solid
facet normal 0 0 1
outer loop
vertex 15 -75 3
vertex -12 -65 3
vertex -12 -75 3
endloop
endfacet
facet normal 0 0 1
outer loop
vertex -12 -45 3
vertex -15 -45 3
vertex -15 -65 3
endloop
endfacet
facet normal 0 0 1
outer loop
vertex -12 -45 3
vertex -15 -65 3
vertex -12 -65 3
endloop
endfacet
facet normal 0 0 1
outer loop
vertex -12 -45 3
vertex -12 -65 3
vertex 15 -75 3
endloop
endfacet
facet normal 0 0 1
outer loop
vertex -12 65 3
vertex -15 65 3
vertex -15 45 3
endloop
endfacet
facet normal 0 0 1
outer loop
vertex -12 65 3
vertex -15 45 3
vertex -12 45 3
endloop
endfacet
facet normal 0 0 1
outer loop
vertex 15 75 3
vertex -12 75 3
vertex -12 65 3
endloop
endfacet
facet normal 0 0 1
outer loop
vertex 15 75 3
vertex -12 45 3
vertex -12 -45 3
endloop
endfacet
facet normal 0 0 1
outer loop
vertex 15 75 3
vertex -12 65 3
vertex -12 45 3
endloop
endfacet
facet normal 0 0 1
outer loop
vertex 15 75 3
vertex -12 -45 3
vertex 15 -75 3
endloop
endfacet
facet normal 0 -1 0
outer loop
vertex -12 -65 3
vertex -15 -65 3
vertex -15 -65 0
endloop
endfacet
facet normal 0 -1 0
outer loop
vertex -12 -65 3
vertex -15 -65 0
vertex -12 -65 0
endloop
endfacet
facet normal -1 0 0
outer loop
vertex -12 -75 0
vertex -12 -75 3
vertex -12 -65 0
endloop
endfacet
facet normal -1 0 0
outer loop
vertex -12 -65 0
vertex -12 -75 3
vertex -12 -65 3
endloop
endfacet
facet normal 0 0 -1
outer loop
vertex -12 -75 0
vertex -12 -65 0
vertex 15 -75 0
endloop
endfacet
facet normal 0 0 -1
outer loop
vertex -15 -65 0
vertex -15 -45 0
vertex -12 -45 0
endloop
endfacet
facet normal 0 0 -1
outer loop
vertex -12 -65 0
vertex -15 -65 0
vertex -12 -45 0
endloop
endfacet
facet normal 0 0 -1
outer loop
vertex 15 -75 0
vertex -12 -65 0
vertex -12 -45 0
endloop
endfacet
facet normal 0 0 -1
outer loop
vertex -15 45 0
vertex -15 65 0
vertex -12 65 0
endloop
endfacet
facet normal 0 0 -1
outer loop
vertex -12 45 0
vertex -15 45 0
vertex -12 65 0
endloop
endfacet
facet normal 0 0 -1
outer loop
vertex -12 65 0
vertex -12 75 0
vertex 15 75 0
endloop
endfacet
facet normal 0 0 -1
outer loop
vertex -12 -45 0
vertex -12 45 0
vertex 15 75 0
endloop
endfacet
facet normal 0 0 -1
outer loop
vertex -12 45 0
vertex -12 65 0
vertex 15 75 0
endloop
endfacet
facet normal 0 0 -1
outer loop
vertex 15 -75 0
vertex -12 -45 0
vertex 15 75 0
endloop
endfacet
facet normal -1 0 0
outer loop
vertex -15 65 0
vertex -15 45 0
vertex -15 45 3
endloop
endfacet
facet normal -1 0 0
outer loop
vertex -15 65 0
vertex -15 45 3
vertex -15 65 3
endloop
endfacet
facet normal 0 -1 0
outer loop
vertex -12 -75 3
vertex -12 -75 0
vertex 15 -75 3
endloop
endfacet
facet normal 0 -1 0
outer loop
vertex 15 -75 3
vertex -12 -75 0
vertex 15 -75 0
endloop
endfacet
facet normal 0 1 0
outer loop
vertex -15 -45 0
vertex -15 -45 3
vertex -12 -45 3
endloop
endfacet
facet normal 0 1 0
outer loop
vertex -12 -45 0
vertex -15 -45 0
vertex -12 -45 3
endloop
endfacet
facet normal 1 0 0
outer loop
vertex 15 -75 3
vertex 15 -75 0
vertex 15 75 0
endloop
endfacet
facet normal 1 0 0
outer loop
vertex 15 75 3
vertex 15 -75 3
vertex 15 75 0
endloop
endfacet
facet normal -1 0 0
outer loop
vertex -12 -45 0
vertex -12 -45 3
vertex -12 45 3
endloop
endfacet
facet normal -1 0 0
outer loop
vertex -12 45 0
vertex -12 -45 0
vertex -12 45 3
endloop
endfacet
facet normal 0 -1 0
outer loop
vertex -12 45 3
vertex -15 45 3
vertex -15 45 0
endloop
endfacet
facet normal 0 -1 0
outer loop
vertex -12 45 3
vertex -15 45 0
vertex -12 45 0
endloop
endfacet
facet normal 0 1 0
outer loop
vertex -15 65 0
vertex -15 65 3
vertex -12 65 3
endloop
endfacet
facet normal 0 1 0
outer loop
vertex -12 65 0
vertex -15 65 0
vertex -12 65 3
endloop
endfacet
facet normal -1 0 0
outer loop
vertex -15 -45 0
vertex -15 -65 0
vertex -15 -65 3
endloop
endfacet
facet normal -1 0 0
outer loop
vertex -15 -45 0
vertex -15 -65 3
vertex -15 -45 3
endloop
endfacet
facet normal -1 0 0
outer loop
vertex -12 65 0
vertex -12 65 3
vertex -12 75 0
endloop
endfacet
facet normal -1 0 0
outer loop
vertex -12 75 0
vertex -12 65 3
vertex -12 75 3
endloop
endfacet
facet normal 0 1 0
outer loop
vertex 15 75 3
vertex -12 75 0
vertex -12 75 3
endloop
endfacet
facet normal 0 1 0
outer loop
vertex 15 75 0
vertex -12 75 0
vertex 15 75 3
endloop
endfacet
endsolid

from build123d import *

# Parameters (mm, degrees)
SKETCH1_W           = 30
SKETCH1_H           = 150
BOSS_EXTRUDE1_DEPTH = 3
SKETCH2_W           = 3
SKETCH2_H           = 10
SKETCH2_H_2         = 90
CUT_EXTRUDE1_DEPTH  = 3


with BuildPart() as part:
    # Sketch1 → Boss-Extrude1 (new body)
    with BuildSketch(Plane.XY):
        Rectangle(SKETCH1_W, SKETCH1_H)
    extrude(amount=BOSS_EXTRUDE1_DEPTH)

    # Sketch2 → Cut-Extrude1 (cut)
    with BuildSketch(Plane.XY.offset(3)):
        with Locations((-13.5, 70)):
            Rectangle(SKETCH2_W, SKETCH2_H)
        with Locations((-13.5, -70)):
            Rectangle(SKETCH2_W, SKETCH2_H)
        with Locations((-13.5, 0)):
            Rectangle(SKETCH2_W, SKETCH2_H_2)
    extrude(amount=-CUT_EXTRUDE1_DEPTH, mode=Mode.SUBTRACT)


solid = part.part
